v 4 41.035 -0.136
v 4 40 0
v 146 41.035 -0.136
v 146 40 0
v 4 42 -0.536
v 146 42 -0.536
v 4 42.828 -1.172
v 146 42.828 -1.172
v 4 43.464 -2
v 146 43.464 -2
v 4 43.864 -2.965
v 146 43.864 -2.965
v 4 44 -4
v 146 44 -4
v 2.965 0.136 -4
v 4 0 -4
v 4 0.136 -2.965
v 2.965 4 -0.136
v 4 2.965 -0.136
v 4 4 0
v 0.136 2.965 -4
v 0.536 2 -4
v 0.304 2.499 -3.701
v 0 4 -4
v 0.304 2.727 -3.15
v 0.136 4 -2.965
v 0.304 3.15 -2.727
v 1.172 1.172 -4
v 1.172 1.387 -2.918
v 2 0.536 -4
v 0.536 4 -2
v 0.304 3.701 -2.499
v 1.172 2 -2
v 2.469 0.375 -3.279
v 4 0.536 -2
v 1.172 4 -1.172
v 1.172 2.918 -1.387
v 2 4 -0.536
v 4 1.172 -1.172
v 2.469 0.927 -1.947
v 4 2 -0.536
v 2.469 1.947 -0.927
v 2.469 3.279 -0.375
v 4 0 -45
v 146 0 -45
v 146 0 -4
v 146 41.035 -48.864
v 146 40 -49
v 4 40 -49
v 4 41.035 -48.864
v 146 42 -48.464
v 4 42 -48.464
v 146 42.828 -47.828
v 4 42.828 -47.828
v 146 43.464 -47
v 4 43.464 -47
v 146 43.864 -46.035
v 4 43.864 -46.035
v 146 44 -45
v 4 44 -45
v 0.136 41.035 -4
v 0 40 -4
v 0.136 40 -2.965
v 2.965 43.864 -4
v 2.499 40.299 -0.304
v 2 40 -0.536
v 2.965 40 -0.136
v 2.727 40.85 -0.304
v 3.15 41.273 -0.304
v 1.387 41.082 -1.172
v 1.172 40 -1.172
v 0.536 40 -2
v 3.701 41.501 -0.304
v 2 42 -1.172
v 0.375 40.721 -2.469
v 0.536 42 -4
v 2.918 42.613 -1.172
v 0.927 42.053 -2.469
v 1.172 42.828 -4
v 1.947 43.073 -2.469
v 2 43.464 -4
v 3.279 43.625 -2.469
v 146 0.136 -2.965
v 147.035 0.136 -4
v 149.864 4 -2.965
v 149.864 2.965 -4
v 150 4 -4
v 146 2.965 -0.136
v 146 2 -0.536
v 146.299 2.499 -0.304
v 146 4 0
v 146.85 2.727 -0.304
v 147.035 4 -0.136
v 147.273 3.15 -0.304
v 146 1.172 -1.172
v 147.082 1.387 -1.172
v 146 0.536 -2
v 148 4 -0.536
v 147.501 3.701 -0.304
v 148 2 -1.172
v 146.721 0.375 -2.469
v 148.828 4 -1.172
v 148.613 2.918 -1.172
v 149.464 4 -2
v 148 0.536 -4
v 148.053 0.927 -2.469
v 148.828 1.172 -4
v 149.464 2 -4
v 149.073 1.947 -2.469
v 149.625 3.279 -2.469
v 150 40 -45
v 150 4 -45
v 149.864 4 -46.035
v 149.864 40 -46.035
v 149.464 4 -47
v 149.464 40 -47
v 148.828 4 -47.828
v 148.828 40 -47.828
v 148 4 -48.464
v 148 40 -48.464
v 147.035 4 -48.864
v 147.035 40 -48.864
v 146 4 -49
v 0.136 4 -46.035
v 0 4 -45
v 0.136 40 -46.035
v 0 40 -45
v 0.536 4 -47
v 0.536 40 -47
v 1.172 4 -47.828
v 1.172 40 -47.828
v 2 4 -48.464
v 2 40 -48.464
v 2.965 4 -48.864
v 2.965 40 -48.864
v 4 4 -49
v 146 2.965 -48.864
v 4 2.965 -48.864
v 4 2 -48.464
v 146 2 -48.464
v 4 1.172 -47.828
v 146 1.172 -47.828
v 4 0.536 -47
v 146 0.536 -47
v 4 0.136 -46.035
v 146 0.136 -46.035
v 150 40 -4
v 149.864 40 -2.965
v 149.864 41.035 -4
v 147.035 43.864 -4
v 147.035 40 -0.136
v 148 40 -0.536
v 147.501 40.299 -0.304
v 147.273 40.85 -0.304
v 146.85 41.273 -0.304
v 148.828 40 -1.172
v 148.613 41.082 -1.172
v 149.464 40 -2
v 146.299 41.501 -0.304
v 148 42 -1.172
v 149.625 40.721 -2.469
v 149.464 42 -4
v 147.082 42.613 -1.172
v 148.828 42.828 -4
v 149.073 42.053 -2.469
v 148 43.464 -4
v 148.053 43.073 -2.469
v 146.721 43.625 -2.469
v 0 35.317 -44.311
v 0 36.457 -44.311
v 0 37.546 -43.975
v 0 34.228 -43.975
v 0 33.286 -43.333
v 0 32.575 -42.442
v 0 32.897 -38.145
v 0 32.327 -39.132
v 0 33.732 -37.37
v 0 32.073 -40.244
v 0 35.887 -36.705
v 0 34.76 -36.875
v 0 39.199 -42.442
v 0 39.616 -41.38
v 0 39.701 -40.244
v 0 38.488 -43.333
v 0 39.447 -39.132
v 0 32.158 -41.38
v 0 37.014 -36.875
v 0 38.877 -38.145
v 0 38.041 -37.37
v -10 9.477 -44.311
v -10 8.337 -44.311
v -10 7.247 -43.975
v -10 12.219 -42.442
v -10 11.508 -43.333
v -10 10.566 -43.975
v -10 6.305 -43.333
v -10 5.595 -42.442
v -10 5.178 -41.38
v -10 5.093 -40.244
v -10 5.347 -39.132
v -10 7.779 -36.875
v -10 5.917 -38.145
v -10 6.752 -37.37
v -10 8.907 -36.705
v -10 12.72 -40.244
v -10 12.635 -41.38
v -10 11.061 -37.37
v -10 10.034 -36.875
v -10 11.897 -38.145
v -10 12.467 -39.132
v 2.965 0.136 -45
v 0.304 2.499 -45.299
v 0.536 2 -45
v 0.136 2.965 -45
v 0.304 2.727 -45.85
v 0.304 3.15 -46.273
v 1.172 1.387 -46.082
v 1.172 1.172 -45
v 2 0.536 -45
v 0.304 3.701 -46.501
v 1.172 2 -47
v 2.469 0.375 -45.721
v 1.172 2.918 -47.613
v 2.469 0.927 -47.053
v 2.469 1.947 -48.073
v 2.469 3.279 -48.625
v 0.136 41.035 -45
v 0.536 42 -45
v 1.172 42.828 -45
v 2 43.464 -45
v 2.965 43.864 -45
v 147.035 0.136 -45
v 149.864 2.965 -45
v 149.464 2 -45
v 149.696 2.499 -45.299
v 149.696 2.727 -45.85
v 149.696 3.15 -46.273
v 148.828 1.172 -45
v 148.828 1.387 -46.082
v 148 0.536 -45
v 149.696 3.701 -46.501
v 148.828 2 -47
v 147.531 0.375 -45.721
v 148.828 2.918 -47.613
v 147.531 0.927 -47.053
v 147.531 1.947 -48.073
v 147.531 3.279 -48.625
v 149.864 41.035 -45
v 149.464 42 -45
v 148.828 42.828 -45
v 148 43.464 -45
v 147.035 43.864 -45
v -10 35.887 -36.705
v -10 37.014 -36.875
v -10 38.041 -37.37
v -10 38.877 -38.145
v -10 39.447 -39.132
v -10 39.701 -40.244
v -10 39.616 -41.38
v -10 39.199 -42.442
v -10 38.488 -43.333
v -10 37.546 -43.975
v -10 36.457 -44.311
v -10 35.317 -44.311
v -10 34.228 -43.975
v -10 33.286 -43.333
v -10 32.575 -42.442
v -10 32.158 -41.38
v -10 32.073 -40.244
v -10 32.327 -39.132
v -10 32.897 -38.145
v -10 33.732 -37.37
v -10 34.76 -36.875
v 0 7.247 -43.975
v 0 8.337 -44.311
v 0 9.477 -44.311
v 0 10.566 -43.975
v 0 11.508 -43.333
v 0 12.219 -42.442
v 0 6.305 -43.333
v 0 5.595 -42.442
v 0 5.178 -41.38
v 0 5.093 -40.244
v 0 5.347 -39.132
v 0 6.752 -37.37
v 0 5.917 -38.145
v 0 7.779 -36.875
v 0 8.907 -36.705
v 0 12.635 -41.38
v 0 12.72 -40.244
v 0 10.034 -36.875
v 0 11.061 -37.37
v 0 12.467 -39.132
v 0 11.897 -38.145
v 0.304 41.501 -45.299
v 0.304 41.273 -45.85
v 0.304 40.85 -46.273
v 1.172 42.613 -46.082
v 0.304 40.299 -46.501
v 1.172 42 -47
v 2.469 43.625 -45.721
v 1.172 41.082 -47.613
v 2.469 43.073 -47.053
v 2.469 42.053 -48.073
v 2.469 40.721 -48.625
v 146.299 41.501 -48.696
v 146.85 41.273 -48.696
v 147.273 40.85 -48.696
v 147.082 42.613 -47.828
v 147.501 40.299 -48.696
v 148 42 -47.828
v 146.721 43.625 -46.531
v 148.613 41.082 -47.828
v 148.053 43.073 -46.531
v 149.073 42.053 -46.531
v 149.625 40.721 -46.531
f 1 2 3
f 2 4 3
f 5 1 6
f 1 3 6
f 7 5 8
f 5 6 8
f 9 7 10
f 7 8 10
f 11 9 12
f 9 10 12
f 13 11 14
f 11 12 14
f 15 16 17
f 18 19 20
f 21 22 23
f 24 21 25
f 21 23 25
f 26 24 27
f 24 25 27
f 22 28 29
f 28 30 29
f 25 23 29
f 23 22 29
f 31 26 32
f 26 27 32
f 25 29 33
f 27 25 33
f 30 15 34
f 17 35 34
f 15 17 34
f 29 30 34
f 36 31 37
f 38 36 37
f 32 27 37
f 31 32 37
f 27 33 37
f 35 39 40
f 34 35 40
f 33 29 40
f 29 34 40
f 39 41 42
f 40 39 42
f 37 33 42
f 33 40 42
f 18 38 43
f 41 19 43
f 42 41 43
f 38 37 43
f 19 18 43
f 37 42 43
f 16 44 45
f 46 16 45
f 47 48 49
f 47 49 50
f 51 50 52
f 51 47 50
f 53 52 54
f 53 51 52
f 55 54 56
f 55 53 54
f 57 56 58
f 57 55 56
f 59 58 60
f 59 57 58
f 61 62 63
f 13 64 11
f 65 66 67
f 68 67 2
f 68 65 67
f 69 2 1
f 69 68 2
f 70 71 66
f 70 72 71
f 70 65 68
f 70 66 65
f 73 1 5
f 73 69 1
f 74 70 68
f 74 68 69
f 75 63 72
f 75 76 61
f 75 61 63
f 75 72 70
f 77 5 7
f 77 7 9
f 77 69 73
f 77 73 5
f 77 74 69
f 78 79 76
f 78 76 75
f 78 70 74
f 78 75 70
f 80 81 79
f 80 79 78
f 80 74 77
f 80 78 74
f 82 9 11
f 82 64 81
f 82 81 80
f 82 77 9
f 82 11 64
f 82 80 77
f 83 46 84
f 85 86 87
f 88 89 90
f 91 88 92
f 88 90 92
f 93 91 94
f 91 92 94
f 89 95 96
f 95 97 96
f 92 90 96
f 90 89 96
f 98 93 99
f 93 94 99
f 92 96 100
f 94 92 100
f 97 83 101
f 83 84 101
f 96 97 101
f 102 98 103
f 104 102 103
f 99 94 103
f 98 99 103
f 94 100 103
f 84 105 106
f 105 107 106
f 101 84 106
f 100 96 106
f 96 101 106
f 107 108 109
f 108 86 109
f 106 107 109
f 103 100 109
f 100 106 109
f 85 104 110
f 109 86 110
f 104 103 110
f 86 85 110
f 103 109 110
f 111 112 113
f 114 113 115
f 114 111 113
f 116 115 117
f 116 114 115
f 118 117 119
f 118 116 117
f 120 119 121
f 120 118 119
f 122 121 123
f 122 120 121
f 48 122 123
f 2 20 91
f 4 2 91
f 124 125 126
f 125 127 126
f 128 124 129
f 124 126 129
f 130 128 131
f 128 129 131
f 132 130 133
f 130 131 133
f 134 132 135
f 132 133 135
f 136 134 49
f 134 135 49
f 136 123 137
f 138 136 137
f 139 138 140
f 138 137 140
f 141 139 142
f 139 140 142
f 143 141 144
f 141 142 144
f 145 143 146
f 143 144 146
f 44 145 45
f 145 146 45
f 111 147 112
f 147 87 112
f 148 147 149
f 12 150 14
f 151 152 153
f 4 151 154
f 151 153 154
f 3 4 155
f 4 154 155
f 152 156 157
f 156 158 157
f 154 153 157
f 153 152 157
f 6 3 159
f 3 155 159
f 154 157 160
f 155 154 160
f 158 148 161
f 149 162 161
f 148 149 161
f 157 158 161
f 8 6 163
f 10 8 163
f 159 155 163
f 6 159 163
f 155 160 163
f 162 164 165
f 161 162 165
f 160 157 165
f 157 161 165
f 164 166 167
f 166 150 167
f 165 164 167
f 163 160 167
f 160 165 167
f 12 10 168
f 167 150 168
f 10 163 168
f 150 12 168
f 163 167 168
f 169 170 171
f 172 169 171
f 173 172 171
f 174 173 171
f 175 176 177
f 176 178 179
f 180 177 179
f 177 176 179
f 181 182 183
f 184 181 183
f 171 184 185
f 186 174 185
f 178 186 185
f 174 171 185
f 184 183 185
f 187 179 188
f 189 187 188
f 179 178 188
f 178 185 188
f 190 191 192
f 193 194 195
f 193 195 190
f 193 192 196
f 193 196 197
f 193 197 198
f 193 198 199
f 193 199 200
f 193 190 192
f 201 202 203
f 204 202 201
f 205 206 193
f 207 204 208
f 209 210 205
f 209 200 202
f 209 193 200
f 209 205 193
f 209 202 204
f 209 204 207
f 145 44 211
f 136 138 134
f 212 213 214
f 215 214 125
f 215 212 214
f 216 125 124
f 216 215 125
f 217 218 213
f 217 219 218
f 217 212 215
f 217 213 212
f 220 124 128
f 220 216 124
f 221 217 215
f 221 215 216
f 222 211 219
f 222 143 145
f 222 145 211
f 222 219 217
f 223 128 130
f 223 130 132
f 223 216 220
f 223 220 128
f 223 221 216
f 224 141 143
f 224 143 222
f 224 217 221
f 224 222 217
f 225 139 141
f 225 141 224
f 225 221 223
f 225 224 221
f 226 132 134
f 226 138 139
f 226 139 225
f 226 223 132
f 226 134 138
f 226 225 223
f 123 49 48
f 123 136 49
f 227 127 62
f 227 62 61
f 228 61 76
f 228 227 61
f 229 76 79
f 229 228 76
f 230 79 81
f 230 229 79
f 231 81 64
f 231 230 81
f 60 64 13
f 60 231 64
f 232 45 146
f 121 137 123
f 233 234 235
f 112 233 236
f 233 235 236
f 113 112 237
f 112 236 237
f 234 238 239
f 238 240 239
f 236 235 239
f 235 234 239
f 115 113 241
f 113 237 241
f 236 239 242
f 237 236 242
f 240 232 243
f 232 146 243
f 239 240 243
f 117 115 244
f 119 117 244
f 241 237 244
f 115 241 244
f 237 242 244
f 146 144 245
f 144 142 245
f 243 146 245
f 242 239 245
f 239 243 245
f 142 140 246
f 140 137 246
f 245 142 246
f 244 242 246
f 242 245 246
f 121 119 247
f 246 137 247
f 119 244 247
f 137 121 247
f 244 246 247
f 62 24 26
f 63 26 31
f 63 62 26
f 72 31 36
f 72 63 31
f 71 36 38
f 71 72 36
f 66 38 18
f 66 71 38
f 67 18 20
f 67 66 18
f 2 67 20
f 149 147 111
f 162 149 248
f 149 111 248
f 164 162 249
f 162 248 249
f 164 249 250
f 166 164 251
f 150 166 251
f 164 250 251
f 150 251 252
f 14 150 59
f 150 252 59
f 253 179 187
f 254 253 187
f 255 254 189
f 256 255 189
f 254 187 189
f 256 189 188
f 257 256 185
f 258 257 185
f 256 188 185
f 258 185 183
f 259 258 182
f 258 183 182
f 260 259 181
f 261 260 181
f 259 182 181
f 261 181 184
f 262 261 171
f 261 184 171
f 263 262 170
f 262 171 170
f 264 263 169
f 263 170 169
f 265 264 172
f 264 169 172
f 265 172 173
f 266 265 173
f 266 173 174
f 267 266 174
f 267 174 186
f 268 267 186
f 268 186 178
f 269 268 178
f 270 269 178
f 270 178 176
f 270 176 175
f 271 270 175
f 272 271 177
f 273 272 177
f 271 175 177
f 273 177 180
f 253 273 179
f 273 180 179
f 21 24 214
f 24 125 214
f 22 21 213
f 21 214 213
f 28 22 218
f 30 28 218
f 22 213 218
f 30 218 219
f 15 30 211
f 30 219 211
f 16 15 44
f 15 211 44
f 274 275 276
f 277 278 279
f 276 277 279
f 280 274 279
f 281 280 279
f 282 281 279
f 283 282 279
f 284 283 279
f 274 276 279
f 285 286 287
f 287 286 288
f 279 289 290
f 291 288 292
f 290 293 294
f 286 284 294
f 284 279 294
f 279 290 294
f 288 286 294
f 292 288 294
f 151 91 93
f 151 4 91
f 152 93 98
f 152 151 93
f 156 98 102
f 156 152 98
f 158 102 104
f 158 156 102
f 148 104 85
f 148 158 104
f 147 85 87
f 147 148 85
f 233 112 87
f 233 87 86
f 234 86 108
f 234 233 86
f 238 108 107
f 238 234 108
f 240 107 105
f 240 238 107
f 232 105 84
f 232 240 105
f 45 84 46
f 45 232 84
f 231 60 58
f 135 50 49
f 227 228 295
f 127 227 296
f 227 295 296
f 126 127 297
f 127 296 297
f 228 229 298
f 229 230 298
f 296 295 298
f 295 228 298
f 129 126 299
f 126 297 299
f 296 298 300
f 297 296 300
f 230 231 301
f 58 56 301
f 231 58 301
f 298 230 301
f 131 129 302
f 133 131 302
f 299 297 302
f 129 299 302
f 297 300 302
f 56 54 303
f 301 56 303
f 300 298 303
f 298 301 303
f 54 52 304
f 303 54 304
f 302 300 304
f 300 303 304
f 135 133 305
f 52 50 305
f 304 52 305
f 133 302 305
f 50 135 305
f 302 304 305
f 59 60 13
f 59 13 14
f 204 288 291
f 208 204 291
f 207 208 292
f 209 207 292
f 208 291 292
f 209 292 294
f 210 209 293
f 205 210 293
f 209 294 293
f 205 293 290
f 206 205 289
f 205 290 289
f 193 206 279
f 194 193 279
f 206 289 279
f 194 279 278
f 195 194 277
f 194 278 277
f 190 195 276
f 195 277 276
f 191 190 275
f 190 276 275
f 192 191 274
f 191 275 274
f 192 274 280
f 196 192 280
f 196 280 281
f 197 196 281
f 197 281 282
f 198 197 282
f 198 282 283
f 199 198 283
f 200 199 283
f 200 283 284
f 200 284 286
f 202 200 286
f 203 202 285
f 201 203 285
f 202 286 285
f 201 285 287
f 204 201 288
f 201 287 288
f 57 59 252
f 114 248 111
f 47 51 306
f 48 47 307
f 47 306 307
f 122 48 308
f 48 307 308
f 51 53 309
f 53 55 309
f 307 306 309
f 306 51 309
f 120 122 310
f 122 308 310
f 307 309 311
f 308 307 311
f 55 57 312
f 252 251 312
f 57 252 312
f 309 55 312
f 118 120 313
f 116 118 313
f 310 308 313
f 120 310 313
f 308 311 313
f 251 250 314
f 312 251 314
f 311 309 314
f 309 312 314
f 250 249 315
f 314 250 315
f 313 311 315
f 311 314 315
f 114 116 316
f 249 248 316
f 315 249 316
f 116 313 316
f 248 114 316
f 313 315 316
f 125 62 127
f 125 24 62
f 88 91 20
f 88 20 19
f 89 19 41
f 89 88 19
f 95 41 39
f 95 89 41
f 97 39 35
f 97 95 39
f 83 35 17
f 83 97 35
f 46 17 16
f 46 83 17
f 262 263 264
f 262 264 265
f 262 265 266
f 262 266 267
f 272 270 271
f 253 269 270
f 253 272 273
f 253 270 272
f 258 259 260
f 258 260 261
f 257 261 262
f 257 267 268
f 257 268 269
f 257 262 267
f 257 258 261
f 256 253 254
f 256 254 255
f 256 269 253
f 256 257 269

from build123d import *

# Parameters (mm, degrees)
SKETCH1_W             = 150
SKETCH1_H             = 49
BOSS_EXTRUDE1_DEPTH   = 44
SKETCH2_R             = 3.824497405
BOSS_EXTRUDE2_DEPTH   = 10
BOSS_EXTRUDE2_2_DEPTH = 10
FILLET1_R             = 4


with BuildPart() as part:
    # Sketch1 → Boss-Extrude1 (new body)
    with BuildSketch(Plane(origin=(0, 0, 0), x_dir=(1, 0, 0), z_dir=(0, 1, 0))):
        with Locations((75, 24.5)):
            Rectangle(SKETCH1_W, SKETCH1_H)
    extrude(amount=BOSS_EXTRUDE1_DEPTH)

    # Fillet1
    fillet1_edges = [part.edges().sort_by_distance(p)[0] for p in [
        (150, 44, -24.5),
        (75, 44, -49),
        (0, 44, -24.5),
        (75, 0, -49),
        (150, 0, -24.5),
        (75, 0, 0),
        (0, 0, -24.5),
        (0, 22, -49),
        (150, 22, -49),
        (150, 22, 0),
        (0, 22, 0),
        (75, 44, 0),
    ]]
    fillet(fillet1_edges, radius=FILLET1_R)


with BuildPart() as body_2:
    # Sketch2 → Boss-Extrude2 (new body)
    with BuildSketch(Plane.ZY):
        with Locations((-40.529448577, 35.886898519)):
            Circle(SKETCH2_R)
    extrude(amount=BOSS_EXTRUDE2_DEPTH)


with BuildPart() as body_3:
    # Sketch2 → Boss-Extrude2 2 (new body)
    with BuildSketch(Plane.ZY):
        with Locations((-40.529448577, 8.906638539)):
            Circle(SKETCH2_R)
    extrude(amount=BOSS_EXTRUDE2_2_DEPTH)


solid = Compound([part.part, body_2.part, body_3.part])
